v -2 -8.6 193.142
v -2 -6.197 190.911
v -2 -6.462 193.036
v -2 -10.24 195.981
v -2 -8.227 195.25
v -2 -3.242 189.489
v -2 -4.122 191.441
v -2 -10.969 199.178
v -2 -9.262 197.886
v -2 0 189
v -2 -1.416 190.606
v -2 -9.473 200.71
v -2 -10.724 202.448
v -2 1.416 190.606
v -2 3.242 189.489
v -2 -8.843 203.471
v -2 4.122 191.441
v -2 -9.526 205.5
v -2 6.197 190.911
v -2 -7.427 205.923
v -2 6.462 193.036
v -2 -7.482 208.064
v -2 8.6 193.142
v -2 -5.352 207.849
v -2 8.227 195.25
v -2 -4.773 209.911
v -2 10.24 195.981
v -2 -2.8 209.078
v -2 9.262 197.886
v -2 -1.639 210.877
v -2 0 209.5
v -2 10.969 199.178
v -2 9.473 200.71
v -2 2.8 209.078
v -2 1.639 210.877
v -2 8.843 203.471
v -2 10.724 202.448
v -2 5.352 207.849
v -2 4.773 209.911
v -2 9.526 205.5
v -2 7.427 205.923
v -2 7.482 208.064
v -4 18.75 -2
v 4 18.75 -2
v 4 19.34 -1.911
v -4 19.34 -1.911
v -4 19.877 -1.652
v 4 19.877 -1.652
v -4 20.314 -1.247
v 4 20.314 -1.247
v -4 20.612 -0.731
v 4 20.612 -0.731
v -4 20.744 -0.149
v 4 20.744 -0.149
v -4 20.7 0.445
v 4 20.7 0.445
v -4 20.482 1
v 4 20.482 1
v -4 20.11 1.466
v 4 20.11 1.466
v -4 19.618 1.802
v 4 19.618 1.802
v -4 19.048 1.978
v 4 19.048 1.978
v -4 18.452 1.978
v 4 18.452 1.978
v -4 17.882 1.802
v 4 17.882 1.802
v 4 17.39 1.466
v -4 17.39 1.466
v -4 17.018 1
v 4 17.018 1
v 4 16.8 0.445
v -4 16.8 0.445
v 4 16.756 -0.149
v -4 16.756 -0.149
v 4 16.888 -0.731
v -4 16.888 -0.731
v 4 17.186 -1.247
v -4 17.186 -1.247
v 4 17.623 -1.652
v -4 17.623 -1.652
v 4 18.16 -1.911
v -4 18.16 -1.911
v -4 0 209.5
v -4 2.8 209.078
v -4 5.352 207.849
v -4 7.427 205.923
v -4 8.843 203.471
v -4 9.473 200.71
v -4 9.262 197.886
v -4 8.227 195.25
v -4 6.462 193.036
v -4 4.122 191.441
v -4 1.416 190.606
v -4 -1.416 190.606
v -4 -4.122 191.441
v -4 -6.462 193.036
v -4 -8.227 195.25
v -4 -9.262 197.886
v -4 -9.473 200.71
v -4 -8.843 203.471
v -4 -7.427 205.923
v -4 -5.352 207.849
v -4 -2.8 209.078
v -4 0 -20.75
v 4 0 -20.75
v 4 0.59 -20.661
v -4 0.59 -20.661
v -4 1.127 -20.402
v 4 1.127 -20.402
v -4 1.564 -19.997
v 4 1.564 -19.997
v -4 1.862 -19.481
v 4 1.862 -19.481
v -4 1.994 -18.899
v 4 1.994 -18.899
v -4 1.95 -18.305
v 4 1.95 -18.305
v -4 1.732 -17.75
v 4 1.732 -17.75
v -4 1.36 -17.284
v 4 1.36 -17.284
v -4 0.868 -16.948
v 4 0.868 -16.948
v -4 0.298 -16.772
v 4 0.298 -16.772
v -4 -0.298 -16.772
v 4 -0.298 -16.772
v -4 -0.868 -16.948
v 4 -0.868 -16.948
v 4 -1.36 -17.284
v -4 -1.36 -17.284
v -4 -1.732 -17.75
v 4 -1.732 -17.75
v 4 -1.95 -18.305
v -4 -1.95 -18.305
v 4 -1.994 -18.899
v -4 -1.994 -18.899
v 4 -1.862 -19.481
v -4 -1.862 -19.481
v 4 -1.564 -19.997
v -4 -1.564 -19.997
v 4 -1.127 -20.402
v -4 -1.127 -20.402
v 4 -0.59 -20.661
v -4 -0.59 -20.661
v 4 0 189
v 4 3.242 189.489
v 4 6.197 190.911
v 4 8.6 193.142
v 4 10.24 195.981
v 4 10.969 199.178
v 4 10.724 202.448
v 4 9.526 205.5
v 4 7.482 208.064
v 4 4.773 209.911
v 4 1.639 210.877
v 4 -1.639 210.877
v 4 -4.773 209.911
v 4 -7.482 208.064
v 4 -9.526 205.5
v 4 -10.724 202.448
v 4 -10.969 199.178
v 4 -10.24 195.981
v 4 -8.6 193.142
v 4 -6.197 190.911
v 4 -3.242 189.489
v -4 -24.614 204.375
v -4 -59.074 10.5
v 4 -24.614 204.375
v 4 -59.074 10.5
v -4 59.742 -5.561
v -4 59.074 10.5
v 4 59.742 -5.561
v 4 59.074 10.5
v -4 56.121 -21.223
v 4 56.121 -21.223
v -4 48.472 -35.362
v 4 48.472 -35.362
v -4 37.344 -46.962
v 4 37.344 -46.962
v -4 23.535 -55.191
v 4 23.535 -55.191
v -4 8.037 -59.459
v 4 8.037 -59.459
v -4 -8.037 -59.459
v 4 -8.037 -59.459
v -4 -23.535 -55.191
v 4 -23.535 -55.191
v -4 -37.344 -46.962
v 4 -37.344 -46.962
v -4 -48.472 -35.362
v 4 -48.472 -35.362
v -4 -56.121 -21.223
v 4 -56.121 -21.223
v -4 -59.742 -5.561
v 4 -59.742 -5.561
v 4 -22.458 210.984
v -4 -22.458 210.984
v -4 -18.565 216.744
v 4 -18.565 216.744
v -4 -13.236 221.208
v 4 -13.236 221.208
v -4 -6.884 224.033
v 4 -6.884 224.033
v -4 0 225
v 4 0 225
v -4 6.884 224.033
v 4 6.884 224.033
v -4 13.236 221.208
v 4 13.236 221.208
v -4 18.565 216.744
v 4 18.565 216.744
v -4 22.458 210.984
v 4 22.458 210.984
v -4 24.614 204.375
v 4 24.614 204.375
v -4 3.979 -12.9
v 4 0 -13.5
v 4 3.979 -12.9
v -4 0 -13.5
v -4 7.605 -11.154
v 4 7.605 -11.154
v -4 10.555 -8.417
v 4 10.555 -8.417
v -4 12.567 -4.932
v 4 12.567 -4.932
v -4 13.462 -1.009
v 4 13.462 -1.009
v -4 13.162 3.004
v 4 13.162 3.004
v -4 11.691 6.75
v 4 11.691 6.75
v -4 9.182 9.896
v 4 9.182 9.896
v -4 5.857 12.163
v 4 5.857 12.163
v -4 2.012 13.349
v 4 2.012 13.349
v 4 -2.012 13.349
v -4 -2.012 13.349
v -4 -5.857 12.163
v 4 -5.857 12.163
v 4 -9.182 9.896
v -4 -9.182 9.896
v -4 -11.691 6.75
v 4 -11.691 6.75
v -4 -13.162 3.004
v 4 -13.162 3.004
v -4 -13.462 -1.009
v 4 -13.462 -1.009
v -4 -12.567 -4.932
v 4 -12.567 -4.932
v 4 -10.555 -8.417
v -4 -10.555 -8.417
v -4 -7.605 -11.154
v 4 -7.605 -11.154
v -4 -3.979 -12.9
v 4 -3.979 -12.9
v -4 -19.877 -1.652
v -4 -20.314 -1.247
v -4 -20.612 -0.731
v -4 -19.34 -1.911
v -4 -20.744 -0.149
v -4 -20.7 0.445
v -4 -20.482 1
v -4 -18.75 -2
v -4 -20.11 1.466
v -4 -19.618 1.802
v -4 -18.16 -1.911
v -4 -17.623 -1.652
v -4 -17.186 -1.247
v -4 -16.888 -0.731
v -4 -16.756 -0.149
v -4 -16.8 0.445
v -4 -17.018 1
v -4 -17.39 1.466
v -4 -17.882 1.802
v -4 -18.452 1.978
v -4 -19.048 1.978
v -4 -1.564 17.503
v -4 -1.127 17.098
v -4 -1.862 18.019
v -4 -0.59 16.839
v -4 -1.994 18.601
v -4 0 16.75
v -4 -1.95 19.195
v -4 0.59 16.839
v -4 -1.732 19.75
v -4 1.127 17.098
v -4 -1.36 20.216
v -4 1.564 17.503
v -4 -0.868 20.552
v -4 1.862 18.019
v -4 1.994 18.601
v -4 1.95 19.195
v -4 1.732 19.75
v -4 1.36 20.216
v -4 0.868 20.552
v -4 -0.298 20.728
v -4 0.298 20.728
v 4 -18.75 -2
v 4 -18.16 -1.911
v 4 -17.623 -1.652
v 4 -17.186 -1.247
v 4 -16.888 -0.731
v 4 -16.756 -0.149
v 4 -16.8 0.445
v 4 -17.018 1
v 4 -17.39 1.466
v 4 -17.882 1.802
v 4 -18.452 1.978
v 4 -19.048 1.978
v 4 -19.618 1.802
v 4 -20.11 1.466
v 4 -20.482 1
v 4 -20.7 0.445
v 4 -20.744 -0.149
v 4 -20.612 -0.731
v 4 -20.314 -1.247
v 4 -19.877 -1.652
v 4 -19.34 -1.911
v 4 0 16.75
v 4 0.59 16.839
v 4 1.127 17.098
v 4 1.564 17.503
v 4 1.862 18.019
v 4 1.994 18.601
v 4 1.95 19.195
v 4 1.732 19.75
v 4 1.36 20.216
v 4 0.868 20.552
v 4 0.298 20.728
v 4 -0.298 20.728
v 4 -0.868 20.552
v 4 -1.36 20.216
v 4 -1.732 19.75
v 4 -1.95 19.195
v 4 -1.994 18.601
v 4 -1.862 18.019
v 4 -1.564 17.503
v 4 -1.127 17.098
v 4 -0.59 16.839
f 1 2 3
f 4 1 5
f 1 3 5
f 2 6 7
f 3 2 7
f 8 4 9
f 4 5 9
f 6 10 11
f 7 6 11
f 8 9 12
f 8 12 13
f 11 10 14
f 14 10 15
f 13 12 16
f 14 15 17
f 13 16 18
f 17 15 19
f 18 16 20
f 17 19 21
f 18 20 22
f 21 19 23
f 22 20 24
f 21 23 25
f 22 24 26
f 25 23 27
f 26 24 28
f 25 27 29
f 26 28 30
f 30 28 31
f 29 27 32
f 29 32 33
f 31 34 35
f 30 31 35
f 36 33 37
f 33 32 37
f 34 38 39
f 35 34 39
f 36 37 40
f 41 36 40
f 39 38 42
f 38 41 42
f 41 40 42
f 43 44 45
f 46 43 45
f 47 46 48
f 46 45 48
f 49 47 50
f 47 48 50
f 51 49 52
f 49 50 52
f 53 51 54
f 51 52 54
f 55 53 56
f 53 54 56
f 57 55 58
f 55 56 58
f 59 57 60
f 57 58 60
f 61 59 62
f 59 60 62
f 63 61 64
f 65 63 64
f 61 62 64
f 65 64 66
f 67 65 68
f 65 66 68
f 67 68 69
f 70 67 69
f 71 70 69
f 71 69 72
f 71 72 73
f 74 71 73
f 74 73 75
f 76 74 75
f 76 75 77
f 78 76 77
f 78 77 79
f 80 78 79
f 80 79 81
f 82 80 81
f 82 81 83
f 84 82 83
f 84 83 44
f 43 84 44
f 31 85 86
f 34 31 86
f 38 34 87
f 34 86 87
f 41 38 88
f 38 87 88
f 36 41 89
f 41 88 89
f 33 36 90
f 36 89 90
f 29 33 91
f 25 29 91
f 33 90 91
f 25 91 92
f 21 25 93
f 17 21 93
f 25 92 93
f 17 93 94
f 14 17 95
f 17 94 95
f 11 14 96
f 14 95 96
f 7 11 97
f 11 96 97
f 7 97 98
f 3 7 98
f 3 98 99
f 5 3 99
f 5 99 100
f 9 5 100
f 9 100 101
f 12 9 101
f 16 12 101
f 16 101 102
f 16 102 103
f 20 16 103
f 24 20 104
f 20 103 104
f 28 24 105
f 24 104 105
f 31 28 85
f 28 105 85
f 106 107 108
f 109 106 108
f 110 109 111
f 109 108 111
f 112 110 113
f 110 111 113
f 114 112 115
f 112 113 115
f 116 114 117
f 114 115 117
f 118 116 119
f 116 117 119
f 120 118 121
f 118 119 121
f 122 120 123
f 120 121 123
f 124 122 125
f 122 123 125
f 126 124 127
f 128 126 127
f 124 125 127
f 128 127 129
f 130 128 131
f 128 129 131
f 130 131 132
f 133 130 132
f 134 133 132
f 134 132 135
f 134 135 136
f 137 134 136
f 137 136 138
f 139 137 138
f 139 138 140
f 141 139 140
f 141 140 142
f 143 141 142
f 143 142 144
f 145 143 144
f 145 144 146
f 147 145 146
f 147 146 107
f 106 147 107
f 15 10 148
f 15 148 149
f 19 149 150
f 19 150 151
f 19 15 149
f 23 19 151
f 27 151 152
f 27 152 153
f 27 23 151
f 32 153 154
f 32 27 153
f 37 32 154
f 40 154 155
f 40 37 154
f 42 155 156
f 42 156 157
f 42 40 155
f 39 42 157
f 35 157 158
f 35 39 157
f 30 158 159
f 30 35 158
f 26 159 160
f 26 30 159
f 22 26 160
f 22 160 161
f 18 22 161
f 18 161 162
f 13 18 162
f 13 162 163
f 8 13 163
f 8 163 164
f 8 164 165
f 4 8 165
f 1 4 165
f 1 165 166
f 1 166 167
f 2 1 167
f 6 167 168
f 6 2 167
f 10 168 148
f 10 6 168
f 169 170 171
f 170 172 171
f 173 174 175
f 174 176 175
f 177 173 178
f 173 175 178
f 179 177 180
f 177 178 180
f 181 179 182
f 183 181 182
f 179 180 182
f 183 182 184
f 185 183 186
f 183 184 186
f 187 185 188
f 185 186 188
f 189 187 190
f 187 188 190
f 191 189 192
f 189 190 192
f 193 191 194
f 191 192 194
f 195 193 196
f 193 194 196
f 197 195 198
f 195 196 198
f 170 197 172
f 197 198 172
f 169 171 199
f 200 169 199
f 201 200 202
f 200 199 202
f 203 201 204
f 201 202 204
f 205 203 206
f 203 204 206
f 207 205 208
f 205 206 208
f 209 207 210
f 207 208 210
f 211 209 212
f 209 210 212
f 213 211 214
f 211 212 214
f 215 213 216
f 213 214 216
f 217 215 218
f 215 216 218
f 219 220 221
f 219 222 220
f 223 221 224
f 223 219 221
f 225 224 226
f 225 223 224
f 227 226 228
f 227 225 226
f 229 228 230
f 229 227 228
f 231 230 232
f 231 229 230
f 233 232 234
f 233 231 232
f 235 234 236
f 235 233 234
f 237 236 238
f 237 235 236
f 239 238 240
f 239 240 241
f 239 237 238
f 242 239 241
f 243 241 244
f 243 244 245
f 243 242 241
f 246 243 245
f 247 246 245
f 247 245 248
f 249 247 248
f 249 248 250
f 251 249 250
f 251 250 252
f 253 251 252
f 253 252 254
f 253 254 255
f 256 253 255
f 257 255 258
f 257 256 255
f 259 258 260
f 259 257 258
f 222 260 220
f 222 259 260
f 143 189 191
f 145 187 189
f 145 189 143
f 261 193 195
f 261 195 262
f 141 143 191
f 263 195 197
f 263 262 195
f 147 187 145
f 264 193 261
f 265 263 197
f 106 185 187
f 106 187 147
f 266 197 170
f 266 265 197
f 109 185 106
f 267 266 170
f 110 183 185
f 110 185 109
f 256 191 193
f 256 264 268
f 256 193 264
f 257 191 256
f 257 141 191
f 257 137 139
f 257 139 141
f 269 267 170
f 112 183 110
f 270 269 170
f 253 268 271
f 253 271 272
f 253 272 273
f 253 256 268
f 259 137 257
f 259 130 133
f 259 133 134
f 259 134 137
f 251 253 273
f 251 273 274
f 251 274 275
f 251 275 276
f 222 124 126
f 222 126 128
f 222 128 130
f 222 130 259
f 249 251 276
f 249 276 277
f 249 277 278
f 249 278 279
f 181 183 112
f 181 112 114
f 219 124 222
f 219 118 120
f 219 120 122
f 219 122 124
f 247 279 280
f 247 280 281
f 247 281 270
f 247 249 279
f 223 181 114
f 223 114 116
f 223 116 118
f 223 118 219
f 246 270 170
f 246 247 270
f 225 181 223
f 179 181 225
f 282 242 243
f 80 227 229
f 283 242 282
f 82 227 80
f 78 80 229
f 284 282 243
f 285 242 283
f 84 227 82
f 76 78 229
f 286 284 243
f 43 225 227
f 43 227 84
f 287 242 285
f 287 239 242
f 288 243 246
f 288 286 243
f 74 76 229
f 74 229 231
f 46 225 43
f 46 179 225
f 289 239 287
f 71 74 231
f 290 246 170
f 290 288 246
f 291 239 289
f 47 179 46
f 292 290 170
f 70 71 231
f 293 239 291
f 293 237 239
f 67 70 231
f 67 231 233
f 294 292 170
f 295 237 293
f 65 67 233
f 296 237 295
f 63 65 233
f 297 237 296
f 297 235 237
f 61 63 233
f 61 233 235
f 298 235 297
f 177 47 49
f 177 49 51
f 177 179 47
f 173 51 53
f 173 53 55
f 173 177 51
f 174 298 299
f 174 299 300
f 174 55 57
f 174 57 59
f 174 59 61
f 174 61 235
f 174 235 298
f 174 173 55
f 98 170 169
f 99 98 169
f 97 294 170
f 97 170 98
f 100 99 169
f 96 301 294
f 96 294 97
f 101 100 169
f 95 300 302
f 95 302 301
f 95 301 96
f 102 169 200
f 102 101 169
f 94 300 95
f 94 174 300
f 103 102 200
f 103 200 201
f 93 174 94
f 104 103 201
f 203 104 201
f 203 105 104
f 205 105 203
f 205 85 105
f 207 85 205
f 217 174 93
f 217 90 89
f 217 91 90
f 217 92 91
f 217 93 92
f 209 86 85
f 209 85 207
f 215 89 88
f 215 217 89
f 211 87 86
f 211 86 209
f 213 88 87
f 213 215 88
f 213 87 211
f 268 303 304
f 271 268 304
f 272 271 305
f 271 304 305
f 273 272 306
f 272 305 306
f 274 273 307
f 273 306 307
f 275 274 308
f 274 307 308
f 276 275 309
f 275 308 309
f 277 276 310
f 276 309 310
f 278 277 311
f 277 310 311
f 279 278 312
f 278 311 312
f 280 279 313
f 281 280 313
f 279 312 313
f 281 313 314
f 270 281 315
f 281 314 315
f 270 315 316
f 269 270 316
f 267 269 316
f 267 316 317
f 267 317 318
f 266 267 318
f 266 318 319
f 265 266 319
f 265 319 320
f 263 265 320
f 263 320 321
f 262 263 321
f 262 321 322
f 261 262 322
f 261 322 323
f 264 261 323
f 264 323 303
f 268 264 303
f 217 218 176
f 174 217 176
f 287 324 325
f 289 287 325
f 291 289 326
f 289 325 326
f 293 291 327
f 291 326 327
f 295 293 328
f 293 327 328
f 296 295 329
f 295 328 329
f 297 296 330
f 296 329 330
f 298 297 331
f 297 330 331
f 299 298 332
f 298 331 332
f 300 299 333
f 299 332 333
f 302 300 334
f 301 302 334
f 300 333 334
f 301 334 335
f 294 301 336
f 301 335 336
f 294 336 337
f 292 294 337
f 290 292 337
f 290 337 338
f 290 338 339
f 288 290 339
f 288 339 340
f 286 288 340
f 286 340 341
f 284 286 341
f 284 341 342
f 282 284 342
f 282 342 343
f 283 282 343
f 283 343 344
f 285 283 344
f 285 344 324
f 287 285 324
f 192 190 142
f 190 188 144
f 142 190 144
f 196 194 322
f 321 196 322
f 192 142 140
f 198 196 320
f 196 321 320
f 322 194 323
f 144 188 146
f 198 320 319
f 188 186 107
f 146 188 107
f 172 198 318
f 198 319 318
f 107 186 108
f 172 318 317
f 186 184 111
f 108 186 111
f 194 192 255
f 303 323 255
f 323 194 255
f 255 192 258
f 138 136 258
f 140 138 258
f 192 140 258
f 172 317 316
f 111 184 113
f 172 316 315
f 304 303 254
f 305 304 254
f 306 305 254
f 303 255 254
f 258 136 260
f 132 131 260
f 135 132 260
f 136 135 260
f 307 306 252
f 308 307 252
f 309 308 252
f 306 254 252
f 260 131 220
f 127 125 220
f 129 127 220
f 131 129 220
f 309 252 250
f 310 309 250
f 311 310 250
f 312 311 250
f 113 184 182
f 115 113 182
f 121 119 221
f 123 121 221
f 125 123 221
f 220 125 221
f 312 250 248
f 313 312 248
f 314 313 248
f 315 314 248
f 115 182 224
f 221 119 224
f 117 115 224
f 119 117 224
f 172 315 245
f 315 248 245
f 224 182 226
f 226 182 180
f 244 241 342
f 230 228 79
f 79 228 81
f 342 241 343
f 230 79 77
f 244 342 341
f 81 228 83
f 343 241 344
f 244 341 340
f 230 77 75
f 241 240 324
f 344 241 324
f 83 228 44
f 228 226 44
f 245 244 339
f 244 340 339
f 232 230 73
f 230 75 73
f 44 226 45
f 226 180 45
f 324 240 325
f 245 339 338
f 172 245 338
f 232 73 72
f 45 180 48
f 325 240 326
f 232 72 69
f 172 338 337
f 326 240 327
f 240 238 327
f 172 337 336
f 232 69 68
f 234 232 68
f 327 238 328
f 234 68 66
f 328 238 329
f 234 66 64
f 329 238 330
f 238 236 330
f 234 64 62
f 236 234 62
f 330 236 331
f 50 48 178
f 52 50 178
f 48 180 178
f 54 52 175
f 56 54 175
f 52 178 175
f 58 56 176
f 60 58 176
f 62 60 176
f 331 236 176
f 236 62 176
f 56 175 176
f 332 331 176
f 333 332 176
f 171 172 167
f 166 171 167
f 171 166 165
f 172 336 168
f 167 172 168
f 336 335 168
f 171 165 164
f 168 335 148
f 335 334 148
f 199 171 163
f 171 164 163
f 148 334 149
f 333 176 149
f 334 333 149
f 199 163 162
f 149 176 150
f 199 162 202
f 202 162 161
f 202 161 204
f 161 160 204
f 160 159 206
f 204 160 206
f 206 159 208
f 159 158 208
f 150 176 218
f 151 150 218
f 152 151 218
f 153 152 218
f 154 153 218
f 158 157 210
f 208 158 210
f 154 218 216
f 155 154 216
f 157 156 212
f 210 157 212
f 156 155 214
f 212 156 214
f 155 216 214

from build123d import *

# Parameters (mm, degrees)
SKETCH1_R           = 13.5
SKETCH1_R_2         = 11
BOSS_EXTRUDE1_DEPTH = 4
SKETCH2_R           = 2
CUT_EXTRUDE1_DEPTH  = 234
SKETCH3_R           = 11
SKETCH3_R_2         = 9.5
BOSS_EXTRUDE3_DEPTH = 2


with BuildPart() as part:
    # Sketch1 → Boss-Extrude1 (new, symmetric)
    with BuildSketch(Plane(origin=(0, 0, 0), x_dir=(0, 0, -1), z_dir=(1, 0, 0))):
        with BuildLine():
            Line((-204.375, 24.614210834), (-10.5, 59.074106003))
            ThreePointArc((-10.5, 59.074106003), (60, 0), (-10.5, -59.074106003))
            Line((-10.5, -59.074106003), (-204.375, -24.614210834))
            ThreePointArc((-204.375, -24.614210834), (-225, 0), (-204.375, 24.614210834))
        make_face()
        Circle(SKETCH1_R, mode=Mode.SUBTRACT)
        with Locations((-200, 0)):
            Circle(SKETCH1_R_2, mode=Mode.SUBTRACT)
    extrude(amount=BOSS_EXTRUDE1_DEPTH, both=True)

    # Sketch2 → Cut-Extrude1 (cut, through all)
    with BuildSketch(Plane(origin=(4, 0, 0), x_dir=(0, 0, -1), z_dir=(1, 0, 0))):
        with Locations((0, 18.75)):
            Circle(SKETCH2_R)
        with Locations((18.75, 0)):
            Circle(SKETCH2_R)
        with Locations((0, -18.75)):
            Circle(SKETCH2_R)
        with Locations((-18.75, 0)):
            Circle(SKETCH2_R)
    extrude(amount=-CUT_EXTRUDE1_DEPTH, mode=Mode.SUBTRACT)

    # Sketch3 → Boss-Extrude3 (add)
    with BuildSketch(Plane.ZY.offset(4)):
        with Locations((200, 0)):
            Circle(SKETCH3_R)
        with Locations((200, 0)):
            Circle(SKETCH3_R_2, mode=Mode.SUBTRACT)
    extrude(amount=-BOSS_EXTRUDE3_DEPTH)


solid = part.part
